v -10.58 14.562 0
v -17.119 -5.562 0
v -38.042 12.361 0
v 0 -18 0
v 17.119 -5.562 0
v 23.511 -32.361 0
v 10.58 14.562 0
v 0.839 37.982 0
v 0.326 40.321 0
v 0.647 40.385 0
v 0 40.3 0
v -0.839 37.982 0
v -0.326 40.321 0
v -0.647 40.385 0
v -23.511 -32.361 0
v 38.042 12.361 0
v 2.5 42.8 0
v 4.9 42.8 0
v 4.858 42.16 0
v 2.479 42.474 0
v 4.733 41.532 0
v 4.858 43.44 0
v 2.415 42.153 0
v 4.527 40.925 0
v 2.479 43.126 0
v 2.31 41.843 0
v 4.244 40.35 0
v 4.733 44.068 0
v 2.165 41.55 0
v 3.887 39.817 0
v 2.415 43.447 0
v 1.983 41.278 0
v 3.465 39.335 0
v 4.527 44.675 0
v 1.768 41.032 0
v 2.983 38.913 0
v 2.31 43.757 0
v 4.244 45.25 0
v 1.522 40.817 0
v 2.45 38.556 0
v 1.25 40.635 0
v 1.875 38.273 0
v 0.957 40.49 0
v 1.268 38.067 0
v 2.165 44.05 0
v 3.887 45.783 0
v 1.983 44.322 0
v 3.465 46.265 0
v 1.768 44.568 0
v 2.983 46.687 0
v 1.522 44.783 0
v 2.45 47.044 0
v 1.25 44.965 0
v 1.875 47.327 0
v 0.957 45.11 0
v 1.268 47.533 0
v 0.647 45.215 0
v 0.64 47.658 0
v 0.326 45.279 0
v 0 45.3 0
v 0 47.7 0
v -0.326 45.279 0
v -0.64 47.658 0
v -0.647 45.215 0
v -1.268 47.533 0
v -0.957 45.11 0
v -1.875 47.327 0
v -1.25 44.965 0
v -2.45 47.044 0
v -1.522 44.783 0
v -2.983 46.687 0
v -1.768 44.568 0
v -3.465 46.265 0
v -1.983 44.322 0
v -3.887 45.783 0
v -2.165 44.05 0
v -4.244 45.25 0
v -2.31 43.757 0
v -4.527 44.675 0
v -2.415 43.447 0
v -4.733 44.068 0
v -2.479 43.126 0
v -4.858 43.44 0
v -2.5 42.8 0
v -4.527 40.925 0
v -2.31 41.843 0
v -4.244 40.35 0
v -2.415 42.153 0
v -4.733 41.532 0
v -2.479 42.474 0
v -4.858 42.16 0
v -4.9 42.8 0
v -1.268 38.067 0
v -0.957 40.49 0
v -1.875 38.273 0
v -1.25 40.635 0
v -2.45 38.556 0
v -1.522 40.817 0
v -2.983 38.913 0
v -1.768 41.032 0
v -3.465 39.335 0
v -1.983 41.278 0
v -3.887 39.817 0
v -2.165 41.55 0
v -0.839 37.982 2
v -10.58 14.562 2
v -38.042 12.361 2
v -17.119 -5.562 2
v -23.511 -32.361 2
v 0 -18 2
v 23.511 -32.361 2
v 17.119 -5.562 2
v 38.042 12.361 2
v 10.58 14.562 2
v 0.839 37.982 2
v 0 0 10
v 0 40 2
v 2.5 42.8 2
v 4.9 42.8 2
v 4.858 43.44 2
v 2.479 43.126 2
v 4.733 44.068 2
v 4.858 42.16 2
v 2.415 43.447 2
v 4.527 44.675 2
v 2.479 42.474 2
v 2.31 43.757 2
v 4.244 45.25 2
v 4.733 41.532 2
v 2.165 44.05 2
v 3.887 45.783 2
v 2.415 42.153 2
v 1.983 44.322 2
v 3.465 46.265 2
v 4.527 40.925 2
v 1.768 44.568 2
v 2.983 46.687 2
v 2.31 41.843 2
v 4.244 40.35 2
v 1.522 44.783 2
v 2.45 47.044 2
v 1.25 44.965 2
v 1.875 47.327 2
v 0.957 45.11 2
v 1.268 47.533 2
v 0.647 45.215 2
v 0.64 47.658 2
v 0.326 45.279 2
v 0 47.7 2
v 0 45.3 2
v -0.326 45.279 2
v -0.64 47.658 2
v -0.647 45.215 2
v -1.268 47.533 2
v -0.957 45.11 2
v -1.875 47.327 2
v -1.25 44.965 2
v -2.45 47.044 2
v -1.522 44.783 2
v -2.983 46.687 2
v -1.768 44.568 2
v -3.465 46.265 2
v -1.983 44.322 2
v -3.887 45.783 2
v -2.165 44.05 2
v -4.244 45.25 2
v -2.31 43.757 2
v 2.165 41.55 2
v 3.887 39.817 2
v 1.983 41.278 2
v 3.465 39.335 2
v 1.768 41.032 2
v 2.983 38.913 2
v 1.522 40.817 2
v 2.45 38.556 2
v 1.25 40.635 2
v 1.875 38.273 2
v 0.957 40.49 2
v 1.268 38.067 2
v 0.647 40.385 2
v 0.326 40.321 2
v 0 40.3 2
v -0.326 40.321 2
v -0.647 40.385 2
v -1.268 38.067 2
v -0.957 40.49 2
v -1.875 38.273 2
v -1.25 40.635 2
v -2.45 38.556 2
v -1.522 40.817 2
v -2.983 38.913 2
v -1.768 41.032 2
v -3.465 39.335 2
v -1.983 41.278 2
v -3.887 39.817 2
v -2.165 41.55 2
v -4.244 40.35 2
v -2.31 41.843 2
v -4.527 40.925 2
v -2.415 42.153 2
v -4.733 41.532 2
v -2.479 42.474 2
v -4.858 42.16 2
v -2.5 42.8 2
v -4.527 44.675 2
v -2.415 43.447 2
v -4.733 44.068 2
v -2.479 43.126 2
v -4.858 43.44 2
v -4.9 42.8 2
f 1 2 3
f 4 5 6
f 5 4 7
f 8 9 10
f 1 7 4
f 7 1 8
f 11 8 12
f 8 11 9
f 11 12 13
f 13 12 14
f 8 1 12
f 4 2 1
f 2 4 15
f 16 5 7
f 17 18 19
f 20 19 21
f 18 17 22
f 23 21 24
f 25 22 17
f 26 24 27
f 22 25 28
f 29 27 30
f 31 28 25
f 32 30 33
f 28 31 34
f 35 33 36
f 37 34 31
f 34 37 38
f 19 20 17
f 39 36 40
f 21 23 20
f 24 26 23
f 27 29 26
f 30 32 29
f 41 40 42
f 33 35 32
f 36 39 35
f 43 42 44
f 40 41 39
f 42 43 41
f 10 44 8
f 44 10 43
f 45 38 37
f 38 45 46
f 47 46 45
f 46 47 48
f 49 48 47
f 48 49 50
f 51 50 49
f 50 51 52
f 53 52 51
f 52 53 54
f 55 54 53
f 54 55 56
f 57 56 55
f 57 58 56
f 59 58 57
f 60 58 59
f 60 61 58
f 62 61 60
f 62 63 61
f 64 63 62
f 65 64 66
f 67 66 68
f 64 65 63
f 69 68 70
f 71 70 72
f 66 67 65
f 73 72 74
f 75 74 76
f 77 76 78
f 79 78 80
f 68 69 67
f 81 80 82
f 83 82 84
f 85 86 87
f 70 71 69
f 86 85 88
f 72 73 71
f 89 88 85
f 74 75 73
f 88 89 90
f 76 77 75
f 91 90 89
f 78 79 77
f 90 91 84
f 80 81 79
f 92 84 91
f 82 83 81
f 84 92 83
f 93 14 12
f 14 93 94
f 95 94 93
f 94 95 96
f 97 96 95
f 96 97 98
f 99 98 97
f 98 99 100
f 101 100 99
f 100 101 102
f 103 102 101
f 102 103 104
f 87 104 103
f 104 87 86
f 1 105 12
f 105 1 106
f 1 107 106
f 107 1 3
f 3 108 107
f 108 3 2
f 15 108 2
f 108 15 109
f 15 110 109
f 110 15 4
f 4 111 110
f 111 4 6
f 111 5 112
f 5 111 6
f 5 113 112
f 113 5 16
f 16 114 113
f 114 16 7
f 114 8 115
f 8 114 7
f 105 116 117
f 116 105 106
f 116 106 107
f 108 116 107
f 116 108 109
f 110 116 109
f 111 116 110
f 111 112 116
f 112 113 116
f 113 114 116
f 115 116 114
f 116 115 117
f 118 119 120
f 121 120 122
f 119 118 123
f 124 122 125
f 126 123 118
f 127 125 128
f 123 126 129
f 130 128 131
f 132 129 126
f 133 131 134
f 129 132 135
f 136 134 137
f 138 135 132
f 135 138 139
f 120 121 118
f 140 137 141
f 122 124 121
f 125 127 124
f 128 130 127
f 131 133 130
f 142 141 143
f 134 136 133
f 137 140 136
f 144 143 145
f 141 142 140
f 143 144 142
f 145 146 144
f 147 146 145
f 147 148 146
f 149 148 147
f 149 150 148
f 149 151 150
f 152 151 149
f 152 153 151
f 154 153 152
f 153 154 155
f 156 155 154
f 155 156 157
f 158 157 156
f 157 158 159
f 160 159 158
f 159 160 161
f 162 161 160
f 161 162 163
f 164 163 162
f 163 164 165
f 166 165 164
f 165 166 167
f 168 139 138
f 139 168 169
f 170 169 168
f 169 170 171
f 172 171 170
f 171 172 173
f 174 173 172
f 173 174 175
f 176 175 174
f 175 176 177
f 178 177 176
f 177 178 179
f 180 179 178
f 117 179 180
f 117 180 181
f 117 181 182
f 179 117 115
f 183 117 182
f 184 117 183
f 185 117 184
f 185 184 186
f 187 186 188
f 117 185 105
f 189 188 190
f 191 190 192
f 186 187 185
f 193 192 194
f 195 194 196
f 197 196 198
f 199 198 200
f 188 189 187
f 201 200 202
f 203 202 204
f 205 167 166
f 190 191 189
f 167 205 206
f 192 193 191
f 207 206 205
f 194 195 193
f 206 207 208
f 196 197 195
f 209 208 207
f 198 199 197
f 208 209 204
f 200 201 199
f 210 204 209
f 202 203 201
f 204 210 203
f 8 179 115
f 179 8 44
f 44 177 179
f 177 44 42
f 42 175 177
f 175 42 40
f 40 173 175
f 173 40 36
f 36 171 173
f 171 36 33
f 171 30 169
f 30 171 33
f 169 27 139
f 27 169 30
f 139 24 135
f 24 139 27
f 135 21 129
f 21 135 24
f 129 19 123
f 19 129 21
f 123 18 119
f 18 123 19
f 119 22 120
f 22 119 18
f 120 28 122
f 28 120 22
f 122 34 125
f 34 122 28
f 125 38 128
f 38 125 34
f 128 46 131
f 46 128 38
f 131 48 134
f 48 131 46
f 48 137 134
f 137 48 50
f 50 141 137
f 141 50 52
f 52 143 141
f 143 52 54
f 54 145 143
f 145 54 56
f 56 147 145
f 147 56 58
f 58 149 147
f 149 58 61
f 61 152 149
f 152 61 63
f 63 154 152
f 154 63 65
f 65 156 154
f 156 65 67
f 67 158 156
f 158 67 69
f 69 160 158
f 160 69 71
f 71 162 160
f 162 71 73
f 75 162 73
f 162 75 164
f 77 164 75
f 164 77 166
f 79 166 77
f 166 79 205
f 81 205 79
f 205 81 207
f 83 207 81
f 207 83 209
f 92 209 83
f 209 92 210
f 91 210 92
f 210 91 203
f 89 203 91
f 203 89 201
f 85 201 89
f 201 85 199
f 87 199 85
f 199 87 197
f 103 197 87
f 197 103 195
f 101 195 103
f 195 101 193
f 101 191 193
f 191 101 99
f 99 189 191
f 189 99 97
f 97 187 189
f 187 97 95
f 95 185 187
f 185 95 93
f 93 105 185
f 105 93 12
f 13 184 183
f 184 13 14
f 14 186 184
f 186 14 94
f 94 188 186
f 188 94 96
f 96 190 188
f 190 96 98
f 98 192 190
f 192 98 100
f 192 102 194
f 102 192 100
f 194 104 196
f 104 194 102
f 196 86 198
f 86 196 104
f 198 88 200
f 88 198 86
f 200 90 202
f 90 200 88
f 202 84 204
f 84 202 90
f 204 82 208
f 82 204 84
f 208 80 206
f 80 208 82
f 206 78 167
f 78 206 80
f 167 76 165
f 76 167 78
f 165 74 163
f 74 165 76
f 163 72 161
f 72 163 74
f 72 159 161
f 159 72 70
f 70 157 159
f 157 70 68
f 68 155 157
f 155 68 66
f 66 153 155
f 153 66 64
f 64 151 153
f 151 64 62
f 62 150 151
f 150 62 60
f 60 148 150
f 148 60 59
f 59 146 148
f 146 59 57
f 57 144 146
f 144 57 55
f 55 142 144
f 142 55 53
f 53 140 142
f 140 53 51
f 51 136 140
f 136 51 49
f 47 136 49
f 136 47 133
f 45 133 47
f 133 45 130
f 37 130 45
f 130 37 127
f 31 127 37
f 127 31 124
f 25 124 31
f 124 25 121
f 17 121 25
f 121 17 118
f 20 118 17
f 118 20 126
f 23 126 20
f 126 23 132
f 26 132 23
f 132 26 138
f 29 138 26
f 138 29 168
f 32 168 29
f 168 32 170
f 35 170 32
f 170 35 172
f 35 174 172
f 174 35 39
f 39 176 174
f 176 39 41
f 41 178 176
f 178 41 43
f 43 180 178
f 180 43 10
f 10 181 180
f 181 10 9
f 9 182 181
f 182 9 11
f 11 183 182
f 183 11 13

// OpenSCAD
// ── ESTRELA FACETADA PARA PENDURAR ──
// Estrela de N pontas com a frente em bico (facetas até ao centro) e as costas planas, para
// imprimir deitada sem suportes. Leva uma argola na ponta de cima para o fio.
// A mesma conta está em Maker_Pro_Frontend_Prod/lib/decoracao.ts (pré-visualização).
//
// Parâmetros: pontas, raio (mm, ponta), interior (% do raio), altura_relevo, base (mm),
//   argola (true/false), diametro_argola (furo, mm)

function _np() = is_undef(pontas) ? 5 : max(3, round(pontas));
function _R()  = is_undef(raio) ? 40 : raio;
function _ri() = _R() * (is_undef(interior) ? 45 : interior) / 100;
function _hr() = is_undef(altura_relevo) ? 8 : altura_relevo;
function _b()  = is_undef(base) ? 2 : base;
function _arg() = is_undef(argola) || argola == true || argola == 1;
function _da() = is_undef(diametro_argola) ? 5 : diametro_argola;

function _pt(i, z) = let(a = 90 + i * 180 / _np(), r = (i % 2 == 0) ? _R() : _ri()) [r * cos(a), r * sin(a), z];

module estrela() {
    M = 2 * _np();
    pts = concat([for (i = [0 : M - 1]) _pt(i, 0)], [for (i = [0 : M - 1]) _pt(i, _b())],
                 [[0, 0, 0], [0, 0, _b() + _hr()]]);
    C = 2 * M; A = C + 1;
    faces = concat(
        [for (i = [0 : M - 1]) [C, (i + 1) % M, i]],                                         // costas
        [for (i = [0 : M - 1], t = [[i, (i + 1) % M, M + (i + 1) % M], [i, M + (i + 1) % M, M + i]]) t],   // lados
        [for (i = [0 : M - 1]) [A, M + i, M + (i + 1) % M]]                                  // facetas
    );
    polyhedron(points = pts, faces = [for (f = faces) [f[2], f[1], f[0]]], convexity = 3);
}

module argola() {
    ri = _da() / 2; ro = ri + 2.4;
    translate([0, _R() + ri + 0.3, 0])
        linear_extrude(height = max(_b(), 2))
            difference() { circle(r = ro, $fn = 48); circle(r = ri, $fn = 48); }
}

union() {
    estrela();
    if (_arg()) argola();
}
